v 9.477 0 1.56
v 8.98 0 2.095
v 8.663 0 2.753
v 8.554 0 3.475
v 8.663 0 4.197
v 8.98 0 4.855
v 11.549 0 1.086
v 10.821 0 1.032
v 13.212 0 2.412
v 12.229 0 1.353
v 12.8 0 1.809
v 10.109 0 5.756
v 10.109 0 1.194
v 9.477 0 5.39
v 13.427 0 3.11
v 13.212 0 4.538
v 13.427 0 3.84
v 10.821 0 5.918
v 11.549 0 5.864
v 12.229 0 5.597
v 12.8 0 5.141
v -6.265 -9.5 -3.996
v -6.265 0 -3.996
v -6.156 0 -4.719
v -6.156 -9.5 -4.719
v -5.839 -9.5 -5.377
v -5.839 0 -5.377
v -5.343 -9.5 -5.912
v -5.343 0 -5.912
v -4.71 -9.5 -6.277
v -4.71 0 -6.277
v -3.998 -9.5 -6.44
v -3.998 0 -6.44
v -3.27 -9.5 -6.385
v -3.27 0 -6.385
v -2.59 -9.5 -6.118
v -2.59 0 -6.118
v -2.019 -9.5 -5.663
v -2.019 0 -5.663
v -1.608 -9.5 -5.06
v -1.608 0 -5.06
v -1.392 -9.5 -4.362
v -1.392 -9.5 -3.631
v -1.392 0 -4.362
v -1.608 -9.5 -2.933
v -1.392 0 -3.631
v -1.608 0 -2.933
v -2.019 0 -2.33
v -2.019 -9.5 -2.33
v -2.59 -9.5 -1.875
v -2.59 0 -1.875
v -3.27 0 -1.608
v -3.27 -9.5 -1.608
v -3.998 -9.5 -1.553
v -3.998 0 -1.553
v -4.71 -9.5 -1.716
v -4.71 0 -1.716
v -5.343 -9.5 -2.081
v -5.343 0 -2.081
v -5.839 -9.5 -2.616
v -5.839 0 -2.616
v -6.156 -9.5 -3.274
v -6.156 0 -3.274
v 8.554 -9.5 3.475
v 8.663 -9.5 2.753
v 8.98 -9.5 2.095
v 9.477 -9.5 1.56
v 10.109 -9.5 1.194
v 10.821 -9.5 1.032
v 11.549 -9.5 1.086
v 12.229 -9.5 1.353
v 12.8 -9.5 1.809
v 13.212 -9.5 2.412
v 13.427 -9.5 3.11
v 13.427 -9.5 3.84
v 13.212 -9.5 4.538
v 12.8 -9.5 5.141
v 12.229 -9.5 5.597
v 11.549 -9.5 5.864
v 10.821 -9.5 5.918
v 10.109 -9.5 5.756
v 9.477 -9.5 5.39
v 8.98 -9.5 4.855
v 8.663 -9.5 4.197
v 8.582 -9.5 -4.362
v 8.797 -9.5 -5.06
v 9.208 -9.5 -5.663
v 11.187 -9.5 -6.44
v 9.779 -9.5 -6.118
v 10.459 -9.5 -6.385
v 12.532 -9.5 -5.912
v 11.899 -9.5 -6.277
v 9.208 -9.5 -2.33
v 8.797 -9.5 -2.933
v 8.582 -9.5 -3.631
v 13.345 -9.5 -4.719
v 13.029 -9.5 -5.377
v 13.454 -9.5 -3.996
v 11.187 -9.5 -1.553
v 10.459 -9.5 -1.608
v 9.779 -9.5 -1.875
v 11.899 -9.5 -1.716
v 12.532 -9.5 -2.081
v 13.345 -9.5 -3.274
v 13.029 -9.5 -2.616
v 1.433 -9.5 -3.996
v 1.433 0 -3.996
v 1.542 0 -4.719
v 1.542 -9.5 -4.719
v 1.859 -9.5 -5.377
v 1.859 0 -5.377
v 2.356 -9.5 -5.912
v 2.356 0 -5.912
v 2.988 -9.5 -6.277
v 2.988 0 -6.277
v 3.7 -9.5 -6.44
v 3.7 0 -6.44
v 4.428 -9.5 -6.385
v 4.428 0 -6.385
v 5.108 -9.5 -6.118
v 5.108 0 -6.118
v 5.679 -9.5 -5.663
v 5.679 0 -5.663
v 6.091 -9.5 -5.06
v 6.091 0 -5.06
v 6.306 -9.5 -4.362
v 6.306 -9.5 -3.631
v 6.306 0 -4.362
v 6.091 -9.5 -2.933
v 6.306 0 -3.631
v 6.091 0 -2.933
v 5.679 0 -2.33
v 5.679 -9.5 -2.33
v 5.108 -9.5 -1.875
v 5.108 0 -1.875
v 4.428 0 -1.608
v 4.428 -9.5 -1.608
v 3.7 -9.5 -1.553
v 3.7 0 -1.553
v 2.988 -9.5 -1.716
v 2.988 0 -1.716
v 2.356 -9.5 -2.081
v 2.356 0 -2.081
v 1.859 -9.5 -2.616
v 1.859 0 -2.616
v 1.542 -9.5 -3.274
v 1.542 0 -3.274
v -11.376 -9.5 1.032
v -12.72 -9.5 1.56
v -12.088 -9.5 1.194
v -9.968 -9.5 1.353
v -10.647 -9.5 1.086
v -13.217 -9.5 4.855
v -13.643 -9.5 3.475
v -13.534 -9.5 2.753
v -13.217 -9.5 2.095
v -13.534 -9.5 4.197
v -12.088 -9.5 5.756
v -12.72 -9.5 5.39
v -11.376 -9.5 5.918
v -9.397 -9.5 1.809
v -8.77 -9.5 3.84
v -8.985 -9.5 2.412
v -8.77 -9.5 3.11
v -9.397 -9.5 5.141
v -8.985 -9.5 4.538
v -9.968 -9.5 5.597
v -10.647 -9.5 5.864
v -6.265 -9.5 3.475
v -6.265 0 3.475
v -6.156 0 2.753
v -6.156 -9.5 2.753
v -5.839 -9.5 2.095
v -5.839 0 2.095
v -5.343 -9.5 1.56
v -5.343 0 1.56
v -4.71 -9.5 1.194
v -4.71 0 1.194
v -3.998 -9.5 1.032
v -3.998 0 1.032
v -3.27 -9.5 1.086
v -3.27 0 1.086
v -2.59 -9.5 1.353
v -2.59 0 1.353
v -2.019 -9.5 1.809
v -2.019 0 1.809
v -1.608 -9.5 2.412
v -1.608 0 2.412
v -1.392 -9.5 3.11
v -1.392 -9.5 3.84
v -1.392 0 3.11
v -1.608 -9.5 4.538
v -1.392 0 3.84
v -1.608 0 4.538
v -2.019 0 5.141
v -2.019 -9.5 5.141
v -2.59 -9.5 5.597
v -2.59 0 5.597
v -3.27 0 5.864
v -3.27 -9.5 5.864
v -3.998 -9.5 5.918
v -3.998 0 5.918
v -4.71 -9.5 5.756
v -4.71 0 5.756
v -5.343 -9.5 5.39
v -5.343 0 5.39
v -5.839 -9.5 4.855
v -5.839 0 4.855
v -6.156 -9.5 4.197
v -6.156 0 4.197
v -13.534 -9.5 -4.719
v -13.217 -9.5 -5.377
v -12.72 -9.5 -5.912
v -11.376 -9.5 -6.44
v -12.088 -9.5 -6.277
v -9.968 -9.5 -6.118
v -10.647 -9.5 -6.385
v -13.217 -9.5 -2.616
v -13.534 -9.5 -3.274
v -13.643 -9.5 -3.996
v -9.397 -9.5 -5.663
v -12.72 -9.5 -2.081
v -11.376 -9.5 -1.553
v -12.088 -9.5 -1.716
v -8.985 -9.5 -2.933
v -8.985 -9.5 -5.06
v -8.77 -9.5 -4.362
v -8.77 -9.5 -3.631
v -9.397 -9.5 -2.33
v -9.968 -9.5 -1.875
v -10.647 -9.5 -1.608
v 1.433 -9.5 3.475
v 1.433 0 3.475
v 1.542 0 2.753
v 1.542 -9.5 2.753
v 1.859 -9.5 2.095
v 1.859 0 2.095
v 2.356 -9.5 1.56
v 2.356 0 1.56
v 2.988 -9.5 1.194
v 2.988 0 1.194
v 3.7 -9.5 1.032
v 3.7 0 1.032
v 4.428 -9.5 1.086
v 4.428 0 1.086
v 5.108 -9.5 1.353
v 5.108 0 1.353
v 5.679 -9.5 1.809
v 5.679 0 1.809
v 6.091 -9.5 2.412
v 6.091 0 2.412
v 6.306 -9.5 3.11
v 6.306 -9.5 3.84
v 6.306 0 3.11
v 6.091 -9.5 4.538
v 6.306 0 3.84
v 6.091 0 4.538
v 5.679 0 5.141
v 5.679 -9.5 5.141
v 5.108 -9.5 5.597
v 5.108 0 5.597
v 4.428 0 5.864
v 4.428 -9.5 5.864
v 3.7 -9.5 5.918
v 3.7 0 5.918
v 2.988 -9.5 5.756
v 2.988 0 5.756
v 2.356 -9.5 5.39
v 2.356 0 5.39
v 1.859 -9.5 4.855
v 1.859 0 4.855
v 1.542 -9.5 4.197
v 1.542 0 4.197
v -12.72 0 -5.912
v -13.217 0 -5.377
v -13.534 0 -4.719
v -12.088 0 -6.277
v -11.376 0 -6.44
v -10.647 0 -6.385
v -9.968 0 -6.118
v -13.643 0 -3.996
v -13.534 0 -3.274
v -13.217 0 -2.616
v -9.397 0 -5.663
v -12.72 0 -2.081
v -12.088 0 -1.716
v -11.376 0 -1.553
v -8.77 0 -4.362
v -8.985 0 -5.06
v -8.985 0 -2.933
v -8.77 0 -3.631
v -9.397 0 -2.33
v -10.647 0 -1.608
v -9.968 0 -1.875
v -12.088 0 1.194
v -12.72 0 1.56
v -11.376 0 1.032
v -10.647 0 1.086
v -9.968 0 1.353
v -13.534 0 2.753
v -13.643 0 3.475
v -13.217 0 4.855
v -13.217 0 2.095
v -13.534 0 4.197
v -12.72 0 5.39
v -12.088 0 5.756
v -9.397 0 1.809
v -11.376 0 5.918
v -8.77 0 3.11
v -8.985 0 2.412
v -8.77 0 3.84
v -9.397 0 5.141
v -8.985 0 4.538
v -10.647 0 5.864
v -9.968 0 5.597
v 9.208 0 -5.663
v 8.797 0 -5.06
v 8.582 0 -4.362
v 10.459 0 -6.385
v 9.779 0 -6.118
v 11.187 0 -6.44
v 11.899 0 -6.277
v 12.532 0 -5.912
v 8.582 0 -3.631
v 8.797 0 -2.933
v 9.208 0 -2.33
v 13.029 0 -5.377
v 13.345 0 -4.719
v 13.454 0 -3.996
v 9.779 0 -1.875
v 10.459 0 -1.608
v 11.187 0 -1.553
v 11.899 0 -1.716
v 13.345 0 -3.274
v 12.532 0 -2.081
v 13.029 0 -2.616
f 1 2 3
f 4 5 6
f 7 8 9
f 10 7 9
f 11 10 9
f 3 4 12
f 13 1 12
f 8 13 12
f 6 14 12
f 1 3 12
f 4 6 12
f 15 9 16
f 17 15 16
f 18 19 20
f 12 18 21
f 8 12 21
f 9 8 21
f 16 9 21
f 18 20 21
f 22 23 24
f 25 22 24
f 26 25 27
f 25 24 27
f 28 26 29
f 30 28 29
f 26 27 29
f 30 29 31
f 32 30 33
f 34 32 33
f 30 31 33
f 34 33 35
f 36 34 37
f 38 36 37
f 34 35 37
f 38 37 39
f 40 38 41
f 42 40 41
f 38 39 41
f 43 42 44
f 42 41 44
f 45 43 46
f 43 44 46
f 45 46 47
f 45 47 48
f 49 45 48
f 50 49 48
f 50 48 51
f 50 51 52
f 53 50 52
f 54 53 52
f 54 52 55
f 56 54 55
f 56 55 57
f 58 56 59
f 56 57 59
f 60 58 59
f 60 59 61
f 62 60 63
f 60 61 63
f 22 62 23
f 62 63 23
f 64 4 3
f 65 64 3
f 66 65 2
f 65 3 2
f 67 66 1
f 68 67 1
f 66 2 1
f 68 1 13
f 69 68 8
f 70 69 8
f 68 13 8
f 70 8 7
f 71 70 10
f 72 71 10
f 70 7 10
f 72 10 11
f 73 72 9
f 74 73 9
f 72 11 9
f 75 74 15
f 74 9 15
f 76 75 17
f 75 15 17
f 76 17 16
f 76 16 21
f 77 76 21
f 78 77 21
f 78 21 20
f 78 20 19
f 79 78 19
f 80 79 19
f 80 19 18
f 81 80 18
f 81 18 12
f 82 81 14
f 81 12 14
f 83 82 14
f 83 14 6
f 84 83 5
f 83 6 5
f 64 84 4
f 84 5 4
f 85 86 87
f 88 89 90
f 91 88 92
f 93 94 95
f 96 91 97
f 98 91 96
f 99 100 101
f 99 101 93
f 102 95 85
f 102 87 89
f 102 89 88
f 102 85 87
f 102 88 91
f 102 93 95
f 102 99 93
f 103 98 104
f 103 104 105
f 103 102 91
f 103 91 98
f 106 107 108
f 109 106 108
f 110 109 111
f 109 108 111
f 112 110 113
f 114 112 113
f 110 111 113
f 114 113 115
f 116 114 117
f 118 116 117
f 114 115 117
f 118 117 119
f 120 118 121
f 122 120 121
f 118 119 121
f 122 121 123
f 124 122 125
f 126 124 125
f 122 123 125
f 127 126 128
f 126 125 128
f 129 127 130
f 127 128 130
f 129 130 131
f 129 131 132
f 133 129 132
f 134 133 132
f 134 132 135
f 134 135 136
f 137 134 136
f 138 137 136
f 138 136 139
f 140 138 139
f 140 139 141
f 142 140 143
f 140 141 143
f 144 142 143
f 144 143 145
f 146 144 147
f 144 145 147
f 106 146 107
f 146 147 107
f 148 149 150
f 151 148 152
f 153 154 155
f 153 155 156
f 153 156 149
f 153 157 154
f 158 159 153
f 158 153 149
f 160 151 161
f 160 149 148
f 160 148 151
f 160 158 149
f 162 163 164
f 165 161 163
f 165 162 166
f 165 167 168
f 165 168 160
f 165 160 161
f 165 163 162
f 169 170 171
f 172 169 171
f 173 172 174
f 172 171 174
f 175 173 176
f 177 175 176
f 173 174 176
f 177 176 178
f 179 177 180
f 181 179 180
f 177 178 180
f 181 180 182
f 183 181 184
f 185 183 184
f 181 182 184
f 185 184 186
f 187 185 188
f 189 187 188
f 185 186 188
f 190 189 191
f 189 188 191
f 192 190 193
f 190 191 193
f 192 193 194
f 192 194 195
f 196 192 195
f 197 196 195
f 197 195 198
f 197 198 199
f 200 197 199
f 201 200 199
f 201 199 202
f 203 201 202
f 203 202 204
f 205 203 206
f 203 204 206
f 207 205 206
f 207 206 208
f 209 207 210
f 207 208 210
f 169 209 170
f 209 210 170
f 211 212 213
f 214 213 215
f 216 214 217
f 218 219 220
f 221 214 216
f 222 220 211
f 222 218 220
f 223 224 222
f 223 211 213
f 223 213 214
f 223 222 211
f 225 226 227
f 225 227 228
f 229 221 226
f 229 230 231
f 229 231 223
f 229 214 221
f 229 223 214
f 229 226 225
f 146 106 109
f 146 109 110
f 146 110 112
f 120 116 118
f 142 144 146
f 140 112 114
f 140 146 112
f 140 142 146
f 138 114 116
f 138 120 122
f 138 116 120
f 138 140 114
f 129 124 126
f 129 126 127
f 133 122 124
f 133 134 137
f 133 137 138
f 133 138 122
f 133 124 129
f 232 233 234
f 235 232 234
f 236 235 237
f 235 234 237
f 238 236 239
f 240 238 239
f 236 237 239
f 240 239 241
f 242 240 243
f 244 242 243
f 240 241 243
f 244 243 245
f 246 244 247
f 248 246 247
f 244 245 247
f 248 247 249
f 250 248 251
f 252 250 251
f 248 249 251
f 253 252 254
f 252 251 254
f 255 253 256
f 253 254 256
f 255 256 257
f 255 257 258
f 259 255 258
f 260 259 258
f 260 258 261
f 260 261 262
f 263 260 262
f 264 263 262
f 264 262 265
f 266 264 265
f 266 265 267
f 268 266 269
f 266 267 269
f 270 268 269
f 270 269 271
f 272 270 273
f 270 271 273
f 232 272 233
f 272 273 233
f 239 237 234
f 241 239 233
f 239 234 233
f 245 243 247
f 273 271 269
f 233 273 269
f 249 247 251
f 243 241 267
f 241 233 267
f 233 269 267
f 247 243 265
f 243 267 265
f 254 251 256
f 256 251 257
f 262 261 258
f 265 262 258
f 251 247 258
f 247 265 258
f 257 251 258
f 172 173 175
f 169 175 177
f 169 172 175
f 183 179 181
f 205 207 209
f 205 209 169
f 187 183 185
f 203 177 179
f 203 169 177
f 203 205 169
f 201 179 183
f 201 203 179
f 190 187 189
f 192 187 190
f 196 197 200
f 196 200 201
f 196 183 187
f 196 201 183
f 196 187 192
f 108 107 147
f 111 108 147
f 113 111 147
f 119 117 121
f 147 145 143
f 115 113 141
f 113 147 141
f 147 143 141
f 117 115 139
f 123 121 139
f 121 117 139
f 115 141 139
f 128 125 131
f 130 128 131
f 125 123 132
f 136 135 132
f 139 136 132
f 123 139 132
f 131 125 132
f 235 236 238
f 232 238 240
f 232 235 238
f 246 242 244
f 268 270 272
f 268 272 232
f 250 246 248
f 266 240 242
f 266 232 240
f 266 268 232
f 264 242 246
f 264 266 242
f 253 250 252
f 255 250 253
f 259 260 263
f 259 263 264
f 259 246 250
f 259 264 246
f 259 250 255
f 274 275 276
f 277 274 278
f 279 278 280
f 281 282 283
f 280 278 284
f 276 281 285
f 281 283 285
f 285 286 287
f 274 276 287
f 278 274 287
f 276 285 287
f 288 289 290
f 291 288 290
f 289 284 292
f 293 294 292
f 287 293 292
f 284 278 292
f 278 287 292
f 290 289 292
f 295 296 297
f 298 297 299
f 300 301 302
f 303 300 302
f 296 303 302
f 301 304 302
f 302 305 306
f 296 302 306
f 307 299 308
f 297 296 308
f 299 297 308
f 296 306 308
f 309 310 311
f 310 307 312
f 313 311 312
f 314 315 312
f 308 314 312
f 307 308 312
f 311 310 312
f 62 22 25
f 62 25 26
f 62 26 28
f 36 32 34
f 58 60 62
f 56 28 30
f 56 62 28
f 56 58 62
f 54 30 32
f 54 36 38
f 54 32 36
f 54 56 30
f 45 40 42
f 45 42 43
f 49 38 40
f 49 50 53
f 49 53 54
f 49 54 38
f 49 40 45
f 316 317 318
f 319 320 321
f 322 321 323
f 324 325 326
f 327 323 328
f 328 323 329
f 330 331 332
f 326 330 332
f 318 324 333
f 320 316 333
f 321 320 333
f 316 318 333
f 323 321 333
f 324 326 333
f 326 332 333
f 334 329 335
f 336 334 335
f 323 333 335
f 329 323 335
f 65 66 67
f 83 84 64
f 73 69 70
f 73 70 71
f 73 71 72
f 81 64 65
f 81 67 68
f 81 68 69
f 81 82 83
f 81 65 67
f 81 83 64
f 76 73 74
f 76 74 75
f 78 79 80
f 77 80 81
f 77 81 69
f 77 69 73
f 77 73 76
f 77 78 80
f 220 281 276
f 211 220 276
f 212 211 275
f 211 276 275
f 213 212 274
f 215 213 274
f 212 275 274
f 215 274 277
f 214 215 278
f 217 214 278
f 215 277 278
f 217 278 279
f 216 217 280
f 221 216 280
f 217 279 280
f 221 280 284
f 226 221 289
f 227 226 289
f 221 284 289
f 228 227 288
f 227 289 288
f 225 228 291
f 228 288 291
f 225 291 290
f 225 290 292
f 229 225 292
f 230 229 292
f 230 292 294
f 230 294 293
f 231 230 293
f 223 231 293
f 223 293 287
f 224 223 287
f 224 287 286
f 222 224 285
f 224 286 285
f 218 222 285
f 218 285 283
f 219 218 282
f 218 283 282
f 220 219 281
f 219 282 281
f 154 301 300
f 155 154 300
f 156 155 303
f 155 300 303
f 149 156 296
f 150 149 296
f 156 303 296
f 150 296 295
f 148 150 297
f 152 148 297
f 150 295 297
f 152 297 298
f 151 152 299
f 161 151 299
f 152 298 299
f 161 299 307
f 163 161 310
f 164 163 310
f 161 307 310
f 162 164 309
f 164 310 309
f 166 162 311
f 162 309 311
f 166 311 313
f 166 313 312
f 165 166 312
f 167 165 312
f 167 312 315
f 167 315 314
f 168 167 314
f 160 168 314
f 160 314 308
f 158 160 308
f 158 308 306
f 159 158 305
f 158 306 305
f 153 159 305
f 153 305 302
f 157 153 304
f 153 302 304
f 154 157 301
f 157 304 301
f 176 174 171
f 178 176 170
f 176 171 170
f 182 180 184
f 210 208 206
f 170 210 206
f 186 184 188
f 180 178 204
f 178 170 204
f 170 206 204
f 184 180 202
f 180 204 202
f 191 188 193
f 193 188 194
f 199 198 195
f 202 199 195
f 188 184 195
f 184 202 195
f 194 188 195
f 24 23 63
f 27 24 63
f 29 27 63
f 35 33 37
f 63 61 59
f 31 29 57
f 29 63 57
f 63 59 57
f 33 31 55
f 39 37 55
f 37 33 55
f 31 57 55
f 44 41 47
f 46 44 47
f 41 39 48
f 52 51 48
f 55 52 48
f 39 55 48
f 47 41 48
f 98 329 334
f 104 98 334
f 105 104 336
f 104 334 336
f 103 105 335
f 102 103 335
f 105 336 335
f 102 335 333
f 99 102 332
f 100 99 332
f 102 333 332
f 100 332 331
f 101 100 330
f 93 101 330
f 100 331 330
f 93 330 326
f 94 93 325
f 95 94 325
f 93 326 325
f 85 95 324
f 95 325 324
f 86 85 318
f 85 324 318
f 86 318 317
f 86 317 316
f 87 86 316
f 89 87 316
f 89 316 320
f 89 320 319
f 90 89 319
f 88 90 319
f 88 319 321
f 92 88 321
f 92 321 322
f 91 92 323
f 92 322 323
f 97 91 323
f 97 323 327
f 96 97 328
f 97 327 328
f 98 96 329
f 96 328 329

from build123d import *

# Parameters (mm, degrees)
F1_DEPTH = 9.5


with BuildPart() as f1:
    # F0 (on Front) → F1 (new body)
    with BuildSketch(Plane.XZ):
        with BuildLine():
            ThreePointArc((-8.7426458776, 3.475), (-11.1926458776, 5.925), (-13.6426458776, 3.475))
            Line((-13.6426458776, 3.475), (-11.1926458776, 3.475))
            Line((-11.1926458776, 3.475), (-8.7426458776, 3.475))
        make_face()
        with BuildLine():
            Line((-11.1926458776, 3.475), (-13.6426458776, 3.475))
            ThreePointArc((-13.6426458776, 3.475), (-11.1926458776, 1.025), (-8.7426458776, 3.475))
            Line((-8.7426458776, 3.475), (-11.1926458776, 3.475))
        make_face()
    extrude(amount=F1_DEPTH)


with BuildPart() as f1b:
    # F0 (on Front) → F1, piece 2 (new body)
    with BuildSketch(Plane.XZ):
        with BuildLine():
            ThreePointArc((-1.365070726, 3.475), (-3.815070726, 5.925), (-6.265070726, 3.475))
            Line((-6.265070726, 3.475), (-1.365070726, 3.475))
        make_face()
        with BuildLine():
            Line((-1.365070726, 3.475), (-6.265070726, 3.475))
            ThreePointArc((-6.265070726, 3.475), (-3.815070726, 1.025), (-1.365070726, 3.475))
        make_face()
    extrude(amount=F1_DEPTH)


with BuildPart() as f1c:
    # F0 (on Front) → F1, piece 3 (new body)
    with BuildSketch(Plane.XZ):
        with BuildLine():
            Line((1.4332693826, 3.475), (6.3332693826, 3.475))
            ThreePointArc((6.3332693826, 3.475), (3.8832693826, 5.925), (1.4332693826, 3.475))
        make_face()
        with BuildLine():
            ThreePointArc((1.4332693826, 3.475), (3.8832693826, 1.025), (6.3332693826, 3.475))
            Line((6.3332693826, 3.475), (1.4332693826, 3.475))
        make_face()
    extrude(amount=F1_DEPTH)


with BuildPart() as f1d:
    # F0 (on Front) → F1, piece 4 (new body)
    with BuildSketch(Plane.XZ):
        with BuildLine():
            Line((13.415, 3.475), (13.4542346641, 3.475))
            ThreePointArc((13.4542346641, 3.475), (11.0042346641, 5.925), (8.5542346641, 3.475))
            Line((8.5542346641, 3.475), (13.415, 3.475))
        make_face()
        with BuildLine():
            ThreePointArc((8.5542346641, 3.475), (11.0042346641, 1.025), (13.4542346641, 3.475))
            Line((13.4542346641, 3.475), (13.415, 3.475))
            Line((13.415, 3.475), (8.5542346641, 3.475))
        make_face()
    extrude(amount=F1_DEPTH)


with BuildPart() as f1e:
    # F0 (on Front) → F1, piece 5 (new body)
    with BuildSketch(Plane.XZ):
        with BuildLine():
            ThreePointArc((8.5542346641, -3.9964863099), (11.0042346641, -6.4464863099), (13.4542346641, -3.9964863099))
            Line((13.4542346641, -3.9964863099), (8.5542346641, -3.9964863099))
        make_face()
        with BuildLine():
            Line((8.5542346641, -3.9964863099), (13.4542346641, -3.9964863099))
            ThreePointArc((13.4542346641, -3.9964863099), (11.0042346641, -1.5464863099), (8.5542346641, -3.9964863099))
        make_face()
    extrude(amount=F1_DEPTH)


with BuildPart() as f1f:
    # F0 (on Front) → F1, piece 6 (new body)
    with BuildSketch(Plane.XZ):
        with BuildLine():
            Line((1.4332693826, -3.9964863099), (6.3332693826, -3.9964863099))
            ThreePointArc((6.3332693826, -3.9964863099), (3.8832693826, -1.5464863099), (1.4332693826, -3.9964863099))
        make_face()
        with BuildLine():
            ThreePointArc((1.4332693826, -3.9964863099), (3.8832693826, -6.4464863099), (6.3332693826, -3.9964863099))
            Line((6.3332693826, -3.9964863099), (1.4332693826, -3.9964863099))
        make_face()
    extrude(amount=F1_DEPTH)


with BuildPart() as f1g:
    # F0 (on Front) → F1, piece 7 (new body)
    with BuildSketch(Plane.XZ):
        with BuildLine():
            ThreePointArc((-1.365070726, -3.9964863099), (-3.815070726, -1.5464863099), (-6.265070726, -3.9964863099))
            Line((-6.265070726, -3.9964863099), (-1.365070726, -3.9964863099))
        make_face()
        with BuildLine():
            Line((-1.365070726, -3.9964863099), (-6.265070726, -3.9964863099))
            ThreePointArc((-6.265070726, -3.9964863099), (-3.815070726, -6.4464863099), (-1.365070726, -3.9964863099))
        make_face()
    extrude(amount=F1_DEPTH)


with BuildPart() as f1h:
    # F0 (on Front) → F1, piece 8 (new body)
    with BuildSketch(Plane.XZ):
        with BuildLine():
            ThreePointArc((-8.7426458776, -3.9964863099), (-11.1926458776, -1.5464863099), (-13.6426458776, -3.9964863099))
            Line((-13.6426458776, -3.9964863099), (-8.7426458776, -3.9964863099))
        make_face()
        with BuildLine():
            Line((-8.7426458776, -3.9964863099), (-13.6426458776, -3.9964863099))
            ThreePointArc((-13.6426458776, -3.9964863099), (-11.1926458776, -6.4464863099), (-8.7426458776, -3.9964863099))
        make_face()
    extrude(amount=F1_DEPTH)


solid = Compound([f1.part, f1b.part, f1c.part, f1d.part, f1e.part, f1f.part, f1g.part, f1h.part])
